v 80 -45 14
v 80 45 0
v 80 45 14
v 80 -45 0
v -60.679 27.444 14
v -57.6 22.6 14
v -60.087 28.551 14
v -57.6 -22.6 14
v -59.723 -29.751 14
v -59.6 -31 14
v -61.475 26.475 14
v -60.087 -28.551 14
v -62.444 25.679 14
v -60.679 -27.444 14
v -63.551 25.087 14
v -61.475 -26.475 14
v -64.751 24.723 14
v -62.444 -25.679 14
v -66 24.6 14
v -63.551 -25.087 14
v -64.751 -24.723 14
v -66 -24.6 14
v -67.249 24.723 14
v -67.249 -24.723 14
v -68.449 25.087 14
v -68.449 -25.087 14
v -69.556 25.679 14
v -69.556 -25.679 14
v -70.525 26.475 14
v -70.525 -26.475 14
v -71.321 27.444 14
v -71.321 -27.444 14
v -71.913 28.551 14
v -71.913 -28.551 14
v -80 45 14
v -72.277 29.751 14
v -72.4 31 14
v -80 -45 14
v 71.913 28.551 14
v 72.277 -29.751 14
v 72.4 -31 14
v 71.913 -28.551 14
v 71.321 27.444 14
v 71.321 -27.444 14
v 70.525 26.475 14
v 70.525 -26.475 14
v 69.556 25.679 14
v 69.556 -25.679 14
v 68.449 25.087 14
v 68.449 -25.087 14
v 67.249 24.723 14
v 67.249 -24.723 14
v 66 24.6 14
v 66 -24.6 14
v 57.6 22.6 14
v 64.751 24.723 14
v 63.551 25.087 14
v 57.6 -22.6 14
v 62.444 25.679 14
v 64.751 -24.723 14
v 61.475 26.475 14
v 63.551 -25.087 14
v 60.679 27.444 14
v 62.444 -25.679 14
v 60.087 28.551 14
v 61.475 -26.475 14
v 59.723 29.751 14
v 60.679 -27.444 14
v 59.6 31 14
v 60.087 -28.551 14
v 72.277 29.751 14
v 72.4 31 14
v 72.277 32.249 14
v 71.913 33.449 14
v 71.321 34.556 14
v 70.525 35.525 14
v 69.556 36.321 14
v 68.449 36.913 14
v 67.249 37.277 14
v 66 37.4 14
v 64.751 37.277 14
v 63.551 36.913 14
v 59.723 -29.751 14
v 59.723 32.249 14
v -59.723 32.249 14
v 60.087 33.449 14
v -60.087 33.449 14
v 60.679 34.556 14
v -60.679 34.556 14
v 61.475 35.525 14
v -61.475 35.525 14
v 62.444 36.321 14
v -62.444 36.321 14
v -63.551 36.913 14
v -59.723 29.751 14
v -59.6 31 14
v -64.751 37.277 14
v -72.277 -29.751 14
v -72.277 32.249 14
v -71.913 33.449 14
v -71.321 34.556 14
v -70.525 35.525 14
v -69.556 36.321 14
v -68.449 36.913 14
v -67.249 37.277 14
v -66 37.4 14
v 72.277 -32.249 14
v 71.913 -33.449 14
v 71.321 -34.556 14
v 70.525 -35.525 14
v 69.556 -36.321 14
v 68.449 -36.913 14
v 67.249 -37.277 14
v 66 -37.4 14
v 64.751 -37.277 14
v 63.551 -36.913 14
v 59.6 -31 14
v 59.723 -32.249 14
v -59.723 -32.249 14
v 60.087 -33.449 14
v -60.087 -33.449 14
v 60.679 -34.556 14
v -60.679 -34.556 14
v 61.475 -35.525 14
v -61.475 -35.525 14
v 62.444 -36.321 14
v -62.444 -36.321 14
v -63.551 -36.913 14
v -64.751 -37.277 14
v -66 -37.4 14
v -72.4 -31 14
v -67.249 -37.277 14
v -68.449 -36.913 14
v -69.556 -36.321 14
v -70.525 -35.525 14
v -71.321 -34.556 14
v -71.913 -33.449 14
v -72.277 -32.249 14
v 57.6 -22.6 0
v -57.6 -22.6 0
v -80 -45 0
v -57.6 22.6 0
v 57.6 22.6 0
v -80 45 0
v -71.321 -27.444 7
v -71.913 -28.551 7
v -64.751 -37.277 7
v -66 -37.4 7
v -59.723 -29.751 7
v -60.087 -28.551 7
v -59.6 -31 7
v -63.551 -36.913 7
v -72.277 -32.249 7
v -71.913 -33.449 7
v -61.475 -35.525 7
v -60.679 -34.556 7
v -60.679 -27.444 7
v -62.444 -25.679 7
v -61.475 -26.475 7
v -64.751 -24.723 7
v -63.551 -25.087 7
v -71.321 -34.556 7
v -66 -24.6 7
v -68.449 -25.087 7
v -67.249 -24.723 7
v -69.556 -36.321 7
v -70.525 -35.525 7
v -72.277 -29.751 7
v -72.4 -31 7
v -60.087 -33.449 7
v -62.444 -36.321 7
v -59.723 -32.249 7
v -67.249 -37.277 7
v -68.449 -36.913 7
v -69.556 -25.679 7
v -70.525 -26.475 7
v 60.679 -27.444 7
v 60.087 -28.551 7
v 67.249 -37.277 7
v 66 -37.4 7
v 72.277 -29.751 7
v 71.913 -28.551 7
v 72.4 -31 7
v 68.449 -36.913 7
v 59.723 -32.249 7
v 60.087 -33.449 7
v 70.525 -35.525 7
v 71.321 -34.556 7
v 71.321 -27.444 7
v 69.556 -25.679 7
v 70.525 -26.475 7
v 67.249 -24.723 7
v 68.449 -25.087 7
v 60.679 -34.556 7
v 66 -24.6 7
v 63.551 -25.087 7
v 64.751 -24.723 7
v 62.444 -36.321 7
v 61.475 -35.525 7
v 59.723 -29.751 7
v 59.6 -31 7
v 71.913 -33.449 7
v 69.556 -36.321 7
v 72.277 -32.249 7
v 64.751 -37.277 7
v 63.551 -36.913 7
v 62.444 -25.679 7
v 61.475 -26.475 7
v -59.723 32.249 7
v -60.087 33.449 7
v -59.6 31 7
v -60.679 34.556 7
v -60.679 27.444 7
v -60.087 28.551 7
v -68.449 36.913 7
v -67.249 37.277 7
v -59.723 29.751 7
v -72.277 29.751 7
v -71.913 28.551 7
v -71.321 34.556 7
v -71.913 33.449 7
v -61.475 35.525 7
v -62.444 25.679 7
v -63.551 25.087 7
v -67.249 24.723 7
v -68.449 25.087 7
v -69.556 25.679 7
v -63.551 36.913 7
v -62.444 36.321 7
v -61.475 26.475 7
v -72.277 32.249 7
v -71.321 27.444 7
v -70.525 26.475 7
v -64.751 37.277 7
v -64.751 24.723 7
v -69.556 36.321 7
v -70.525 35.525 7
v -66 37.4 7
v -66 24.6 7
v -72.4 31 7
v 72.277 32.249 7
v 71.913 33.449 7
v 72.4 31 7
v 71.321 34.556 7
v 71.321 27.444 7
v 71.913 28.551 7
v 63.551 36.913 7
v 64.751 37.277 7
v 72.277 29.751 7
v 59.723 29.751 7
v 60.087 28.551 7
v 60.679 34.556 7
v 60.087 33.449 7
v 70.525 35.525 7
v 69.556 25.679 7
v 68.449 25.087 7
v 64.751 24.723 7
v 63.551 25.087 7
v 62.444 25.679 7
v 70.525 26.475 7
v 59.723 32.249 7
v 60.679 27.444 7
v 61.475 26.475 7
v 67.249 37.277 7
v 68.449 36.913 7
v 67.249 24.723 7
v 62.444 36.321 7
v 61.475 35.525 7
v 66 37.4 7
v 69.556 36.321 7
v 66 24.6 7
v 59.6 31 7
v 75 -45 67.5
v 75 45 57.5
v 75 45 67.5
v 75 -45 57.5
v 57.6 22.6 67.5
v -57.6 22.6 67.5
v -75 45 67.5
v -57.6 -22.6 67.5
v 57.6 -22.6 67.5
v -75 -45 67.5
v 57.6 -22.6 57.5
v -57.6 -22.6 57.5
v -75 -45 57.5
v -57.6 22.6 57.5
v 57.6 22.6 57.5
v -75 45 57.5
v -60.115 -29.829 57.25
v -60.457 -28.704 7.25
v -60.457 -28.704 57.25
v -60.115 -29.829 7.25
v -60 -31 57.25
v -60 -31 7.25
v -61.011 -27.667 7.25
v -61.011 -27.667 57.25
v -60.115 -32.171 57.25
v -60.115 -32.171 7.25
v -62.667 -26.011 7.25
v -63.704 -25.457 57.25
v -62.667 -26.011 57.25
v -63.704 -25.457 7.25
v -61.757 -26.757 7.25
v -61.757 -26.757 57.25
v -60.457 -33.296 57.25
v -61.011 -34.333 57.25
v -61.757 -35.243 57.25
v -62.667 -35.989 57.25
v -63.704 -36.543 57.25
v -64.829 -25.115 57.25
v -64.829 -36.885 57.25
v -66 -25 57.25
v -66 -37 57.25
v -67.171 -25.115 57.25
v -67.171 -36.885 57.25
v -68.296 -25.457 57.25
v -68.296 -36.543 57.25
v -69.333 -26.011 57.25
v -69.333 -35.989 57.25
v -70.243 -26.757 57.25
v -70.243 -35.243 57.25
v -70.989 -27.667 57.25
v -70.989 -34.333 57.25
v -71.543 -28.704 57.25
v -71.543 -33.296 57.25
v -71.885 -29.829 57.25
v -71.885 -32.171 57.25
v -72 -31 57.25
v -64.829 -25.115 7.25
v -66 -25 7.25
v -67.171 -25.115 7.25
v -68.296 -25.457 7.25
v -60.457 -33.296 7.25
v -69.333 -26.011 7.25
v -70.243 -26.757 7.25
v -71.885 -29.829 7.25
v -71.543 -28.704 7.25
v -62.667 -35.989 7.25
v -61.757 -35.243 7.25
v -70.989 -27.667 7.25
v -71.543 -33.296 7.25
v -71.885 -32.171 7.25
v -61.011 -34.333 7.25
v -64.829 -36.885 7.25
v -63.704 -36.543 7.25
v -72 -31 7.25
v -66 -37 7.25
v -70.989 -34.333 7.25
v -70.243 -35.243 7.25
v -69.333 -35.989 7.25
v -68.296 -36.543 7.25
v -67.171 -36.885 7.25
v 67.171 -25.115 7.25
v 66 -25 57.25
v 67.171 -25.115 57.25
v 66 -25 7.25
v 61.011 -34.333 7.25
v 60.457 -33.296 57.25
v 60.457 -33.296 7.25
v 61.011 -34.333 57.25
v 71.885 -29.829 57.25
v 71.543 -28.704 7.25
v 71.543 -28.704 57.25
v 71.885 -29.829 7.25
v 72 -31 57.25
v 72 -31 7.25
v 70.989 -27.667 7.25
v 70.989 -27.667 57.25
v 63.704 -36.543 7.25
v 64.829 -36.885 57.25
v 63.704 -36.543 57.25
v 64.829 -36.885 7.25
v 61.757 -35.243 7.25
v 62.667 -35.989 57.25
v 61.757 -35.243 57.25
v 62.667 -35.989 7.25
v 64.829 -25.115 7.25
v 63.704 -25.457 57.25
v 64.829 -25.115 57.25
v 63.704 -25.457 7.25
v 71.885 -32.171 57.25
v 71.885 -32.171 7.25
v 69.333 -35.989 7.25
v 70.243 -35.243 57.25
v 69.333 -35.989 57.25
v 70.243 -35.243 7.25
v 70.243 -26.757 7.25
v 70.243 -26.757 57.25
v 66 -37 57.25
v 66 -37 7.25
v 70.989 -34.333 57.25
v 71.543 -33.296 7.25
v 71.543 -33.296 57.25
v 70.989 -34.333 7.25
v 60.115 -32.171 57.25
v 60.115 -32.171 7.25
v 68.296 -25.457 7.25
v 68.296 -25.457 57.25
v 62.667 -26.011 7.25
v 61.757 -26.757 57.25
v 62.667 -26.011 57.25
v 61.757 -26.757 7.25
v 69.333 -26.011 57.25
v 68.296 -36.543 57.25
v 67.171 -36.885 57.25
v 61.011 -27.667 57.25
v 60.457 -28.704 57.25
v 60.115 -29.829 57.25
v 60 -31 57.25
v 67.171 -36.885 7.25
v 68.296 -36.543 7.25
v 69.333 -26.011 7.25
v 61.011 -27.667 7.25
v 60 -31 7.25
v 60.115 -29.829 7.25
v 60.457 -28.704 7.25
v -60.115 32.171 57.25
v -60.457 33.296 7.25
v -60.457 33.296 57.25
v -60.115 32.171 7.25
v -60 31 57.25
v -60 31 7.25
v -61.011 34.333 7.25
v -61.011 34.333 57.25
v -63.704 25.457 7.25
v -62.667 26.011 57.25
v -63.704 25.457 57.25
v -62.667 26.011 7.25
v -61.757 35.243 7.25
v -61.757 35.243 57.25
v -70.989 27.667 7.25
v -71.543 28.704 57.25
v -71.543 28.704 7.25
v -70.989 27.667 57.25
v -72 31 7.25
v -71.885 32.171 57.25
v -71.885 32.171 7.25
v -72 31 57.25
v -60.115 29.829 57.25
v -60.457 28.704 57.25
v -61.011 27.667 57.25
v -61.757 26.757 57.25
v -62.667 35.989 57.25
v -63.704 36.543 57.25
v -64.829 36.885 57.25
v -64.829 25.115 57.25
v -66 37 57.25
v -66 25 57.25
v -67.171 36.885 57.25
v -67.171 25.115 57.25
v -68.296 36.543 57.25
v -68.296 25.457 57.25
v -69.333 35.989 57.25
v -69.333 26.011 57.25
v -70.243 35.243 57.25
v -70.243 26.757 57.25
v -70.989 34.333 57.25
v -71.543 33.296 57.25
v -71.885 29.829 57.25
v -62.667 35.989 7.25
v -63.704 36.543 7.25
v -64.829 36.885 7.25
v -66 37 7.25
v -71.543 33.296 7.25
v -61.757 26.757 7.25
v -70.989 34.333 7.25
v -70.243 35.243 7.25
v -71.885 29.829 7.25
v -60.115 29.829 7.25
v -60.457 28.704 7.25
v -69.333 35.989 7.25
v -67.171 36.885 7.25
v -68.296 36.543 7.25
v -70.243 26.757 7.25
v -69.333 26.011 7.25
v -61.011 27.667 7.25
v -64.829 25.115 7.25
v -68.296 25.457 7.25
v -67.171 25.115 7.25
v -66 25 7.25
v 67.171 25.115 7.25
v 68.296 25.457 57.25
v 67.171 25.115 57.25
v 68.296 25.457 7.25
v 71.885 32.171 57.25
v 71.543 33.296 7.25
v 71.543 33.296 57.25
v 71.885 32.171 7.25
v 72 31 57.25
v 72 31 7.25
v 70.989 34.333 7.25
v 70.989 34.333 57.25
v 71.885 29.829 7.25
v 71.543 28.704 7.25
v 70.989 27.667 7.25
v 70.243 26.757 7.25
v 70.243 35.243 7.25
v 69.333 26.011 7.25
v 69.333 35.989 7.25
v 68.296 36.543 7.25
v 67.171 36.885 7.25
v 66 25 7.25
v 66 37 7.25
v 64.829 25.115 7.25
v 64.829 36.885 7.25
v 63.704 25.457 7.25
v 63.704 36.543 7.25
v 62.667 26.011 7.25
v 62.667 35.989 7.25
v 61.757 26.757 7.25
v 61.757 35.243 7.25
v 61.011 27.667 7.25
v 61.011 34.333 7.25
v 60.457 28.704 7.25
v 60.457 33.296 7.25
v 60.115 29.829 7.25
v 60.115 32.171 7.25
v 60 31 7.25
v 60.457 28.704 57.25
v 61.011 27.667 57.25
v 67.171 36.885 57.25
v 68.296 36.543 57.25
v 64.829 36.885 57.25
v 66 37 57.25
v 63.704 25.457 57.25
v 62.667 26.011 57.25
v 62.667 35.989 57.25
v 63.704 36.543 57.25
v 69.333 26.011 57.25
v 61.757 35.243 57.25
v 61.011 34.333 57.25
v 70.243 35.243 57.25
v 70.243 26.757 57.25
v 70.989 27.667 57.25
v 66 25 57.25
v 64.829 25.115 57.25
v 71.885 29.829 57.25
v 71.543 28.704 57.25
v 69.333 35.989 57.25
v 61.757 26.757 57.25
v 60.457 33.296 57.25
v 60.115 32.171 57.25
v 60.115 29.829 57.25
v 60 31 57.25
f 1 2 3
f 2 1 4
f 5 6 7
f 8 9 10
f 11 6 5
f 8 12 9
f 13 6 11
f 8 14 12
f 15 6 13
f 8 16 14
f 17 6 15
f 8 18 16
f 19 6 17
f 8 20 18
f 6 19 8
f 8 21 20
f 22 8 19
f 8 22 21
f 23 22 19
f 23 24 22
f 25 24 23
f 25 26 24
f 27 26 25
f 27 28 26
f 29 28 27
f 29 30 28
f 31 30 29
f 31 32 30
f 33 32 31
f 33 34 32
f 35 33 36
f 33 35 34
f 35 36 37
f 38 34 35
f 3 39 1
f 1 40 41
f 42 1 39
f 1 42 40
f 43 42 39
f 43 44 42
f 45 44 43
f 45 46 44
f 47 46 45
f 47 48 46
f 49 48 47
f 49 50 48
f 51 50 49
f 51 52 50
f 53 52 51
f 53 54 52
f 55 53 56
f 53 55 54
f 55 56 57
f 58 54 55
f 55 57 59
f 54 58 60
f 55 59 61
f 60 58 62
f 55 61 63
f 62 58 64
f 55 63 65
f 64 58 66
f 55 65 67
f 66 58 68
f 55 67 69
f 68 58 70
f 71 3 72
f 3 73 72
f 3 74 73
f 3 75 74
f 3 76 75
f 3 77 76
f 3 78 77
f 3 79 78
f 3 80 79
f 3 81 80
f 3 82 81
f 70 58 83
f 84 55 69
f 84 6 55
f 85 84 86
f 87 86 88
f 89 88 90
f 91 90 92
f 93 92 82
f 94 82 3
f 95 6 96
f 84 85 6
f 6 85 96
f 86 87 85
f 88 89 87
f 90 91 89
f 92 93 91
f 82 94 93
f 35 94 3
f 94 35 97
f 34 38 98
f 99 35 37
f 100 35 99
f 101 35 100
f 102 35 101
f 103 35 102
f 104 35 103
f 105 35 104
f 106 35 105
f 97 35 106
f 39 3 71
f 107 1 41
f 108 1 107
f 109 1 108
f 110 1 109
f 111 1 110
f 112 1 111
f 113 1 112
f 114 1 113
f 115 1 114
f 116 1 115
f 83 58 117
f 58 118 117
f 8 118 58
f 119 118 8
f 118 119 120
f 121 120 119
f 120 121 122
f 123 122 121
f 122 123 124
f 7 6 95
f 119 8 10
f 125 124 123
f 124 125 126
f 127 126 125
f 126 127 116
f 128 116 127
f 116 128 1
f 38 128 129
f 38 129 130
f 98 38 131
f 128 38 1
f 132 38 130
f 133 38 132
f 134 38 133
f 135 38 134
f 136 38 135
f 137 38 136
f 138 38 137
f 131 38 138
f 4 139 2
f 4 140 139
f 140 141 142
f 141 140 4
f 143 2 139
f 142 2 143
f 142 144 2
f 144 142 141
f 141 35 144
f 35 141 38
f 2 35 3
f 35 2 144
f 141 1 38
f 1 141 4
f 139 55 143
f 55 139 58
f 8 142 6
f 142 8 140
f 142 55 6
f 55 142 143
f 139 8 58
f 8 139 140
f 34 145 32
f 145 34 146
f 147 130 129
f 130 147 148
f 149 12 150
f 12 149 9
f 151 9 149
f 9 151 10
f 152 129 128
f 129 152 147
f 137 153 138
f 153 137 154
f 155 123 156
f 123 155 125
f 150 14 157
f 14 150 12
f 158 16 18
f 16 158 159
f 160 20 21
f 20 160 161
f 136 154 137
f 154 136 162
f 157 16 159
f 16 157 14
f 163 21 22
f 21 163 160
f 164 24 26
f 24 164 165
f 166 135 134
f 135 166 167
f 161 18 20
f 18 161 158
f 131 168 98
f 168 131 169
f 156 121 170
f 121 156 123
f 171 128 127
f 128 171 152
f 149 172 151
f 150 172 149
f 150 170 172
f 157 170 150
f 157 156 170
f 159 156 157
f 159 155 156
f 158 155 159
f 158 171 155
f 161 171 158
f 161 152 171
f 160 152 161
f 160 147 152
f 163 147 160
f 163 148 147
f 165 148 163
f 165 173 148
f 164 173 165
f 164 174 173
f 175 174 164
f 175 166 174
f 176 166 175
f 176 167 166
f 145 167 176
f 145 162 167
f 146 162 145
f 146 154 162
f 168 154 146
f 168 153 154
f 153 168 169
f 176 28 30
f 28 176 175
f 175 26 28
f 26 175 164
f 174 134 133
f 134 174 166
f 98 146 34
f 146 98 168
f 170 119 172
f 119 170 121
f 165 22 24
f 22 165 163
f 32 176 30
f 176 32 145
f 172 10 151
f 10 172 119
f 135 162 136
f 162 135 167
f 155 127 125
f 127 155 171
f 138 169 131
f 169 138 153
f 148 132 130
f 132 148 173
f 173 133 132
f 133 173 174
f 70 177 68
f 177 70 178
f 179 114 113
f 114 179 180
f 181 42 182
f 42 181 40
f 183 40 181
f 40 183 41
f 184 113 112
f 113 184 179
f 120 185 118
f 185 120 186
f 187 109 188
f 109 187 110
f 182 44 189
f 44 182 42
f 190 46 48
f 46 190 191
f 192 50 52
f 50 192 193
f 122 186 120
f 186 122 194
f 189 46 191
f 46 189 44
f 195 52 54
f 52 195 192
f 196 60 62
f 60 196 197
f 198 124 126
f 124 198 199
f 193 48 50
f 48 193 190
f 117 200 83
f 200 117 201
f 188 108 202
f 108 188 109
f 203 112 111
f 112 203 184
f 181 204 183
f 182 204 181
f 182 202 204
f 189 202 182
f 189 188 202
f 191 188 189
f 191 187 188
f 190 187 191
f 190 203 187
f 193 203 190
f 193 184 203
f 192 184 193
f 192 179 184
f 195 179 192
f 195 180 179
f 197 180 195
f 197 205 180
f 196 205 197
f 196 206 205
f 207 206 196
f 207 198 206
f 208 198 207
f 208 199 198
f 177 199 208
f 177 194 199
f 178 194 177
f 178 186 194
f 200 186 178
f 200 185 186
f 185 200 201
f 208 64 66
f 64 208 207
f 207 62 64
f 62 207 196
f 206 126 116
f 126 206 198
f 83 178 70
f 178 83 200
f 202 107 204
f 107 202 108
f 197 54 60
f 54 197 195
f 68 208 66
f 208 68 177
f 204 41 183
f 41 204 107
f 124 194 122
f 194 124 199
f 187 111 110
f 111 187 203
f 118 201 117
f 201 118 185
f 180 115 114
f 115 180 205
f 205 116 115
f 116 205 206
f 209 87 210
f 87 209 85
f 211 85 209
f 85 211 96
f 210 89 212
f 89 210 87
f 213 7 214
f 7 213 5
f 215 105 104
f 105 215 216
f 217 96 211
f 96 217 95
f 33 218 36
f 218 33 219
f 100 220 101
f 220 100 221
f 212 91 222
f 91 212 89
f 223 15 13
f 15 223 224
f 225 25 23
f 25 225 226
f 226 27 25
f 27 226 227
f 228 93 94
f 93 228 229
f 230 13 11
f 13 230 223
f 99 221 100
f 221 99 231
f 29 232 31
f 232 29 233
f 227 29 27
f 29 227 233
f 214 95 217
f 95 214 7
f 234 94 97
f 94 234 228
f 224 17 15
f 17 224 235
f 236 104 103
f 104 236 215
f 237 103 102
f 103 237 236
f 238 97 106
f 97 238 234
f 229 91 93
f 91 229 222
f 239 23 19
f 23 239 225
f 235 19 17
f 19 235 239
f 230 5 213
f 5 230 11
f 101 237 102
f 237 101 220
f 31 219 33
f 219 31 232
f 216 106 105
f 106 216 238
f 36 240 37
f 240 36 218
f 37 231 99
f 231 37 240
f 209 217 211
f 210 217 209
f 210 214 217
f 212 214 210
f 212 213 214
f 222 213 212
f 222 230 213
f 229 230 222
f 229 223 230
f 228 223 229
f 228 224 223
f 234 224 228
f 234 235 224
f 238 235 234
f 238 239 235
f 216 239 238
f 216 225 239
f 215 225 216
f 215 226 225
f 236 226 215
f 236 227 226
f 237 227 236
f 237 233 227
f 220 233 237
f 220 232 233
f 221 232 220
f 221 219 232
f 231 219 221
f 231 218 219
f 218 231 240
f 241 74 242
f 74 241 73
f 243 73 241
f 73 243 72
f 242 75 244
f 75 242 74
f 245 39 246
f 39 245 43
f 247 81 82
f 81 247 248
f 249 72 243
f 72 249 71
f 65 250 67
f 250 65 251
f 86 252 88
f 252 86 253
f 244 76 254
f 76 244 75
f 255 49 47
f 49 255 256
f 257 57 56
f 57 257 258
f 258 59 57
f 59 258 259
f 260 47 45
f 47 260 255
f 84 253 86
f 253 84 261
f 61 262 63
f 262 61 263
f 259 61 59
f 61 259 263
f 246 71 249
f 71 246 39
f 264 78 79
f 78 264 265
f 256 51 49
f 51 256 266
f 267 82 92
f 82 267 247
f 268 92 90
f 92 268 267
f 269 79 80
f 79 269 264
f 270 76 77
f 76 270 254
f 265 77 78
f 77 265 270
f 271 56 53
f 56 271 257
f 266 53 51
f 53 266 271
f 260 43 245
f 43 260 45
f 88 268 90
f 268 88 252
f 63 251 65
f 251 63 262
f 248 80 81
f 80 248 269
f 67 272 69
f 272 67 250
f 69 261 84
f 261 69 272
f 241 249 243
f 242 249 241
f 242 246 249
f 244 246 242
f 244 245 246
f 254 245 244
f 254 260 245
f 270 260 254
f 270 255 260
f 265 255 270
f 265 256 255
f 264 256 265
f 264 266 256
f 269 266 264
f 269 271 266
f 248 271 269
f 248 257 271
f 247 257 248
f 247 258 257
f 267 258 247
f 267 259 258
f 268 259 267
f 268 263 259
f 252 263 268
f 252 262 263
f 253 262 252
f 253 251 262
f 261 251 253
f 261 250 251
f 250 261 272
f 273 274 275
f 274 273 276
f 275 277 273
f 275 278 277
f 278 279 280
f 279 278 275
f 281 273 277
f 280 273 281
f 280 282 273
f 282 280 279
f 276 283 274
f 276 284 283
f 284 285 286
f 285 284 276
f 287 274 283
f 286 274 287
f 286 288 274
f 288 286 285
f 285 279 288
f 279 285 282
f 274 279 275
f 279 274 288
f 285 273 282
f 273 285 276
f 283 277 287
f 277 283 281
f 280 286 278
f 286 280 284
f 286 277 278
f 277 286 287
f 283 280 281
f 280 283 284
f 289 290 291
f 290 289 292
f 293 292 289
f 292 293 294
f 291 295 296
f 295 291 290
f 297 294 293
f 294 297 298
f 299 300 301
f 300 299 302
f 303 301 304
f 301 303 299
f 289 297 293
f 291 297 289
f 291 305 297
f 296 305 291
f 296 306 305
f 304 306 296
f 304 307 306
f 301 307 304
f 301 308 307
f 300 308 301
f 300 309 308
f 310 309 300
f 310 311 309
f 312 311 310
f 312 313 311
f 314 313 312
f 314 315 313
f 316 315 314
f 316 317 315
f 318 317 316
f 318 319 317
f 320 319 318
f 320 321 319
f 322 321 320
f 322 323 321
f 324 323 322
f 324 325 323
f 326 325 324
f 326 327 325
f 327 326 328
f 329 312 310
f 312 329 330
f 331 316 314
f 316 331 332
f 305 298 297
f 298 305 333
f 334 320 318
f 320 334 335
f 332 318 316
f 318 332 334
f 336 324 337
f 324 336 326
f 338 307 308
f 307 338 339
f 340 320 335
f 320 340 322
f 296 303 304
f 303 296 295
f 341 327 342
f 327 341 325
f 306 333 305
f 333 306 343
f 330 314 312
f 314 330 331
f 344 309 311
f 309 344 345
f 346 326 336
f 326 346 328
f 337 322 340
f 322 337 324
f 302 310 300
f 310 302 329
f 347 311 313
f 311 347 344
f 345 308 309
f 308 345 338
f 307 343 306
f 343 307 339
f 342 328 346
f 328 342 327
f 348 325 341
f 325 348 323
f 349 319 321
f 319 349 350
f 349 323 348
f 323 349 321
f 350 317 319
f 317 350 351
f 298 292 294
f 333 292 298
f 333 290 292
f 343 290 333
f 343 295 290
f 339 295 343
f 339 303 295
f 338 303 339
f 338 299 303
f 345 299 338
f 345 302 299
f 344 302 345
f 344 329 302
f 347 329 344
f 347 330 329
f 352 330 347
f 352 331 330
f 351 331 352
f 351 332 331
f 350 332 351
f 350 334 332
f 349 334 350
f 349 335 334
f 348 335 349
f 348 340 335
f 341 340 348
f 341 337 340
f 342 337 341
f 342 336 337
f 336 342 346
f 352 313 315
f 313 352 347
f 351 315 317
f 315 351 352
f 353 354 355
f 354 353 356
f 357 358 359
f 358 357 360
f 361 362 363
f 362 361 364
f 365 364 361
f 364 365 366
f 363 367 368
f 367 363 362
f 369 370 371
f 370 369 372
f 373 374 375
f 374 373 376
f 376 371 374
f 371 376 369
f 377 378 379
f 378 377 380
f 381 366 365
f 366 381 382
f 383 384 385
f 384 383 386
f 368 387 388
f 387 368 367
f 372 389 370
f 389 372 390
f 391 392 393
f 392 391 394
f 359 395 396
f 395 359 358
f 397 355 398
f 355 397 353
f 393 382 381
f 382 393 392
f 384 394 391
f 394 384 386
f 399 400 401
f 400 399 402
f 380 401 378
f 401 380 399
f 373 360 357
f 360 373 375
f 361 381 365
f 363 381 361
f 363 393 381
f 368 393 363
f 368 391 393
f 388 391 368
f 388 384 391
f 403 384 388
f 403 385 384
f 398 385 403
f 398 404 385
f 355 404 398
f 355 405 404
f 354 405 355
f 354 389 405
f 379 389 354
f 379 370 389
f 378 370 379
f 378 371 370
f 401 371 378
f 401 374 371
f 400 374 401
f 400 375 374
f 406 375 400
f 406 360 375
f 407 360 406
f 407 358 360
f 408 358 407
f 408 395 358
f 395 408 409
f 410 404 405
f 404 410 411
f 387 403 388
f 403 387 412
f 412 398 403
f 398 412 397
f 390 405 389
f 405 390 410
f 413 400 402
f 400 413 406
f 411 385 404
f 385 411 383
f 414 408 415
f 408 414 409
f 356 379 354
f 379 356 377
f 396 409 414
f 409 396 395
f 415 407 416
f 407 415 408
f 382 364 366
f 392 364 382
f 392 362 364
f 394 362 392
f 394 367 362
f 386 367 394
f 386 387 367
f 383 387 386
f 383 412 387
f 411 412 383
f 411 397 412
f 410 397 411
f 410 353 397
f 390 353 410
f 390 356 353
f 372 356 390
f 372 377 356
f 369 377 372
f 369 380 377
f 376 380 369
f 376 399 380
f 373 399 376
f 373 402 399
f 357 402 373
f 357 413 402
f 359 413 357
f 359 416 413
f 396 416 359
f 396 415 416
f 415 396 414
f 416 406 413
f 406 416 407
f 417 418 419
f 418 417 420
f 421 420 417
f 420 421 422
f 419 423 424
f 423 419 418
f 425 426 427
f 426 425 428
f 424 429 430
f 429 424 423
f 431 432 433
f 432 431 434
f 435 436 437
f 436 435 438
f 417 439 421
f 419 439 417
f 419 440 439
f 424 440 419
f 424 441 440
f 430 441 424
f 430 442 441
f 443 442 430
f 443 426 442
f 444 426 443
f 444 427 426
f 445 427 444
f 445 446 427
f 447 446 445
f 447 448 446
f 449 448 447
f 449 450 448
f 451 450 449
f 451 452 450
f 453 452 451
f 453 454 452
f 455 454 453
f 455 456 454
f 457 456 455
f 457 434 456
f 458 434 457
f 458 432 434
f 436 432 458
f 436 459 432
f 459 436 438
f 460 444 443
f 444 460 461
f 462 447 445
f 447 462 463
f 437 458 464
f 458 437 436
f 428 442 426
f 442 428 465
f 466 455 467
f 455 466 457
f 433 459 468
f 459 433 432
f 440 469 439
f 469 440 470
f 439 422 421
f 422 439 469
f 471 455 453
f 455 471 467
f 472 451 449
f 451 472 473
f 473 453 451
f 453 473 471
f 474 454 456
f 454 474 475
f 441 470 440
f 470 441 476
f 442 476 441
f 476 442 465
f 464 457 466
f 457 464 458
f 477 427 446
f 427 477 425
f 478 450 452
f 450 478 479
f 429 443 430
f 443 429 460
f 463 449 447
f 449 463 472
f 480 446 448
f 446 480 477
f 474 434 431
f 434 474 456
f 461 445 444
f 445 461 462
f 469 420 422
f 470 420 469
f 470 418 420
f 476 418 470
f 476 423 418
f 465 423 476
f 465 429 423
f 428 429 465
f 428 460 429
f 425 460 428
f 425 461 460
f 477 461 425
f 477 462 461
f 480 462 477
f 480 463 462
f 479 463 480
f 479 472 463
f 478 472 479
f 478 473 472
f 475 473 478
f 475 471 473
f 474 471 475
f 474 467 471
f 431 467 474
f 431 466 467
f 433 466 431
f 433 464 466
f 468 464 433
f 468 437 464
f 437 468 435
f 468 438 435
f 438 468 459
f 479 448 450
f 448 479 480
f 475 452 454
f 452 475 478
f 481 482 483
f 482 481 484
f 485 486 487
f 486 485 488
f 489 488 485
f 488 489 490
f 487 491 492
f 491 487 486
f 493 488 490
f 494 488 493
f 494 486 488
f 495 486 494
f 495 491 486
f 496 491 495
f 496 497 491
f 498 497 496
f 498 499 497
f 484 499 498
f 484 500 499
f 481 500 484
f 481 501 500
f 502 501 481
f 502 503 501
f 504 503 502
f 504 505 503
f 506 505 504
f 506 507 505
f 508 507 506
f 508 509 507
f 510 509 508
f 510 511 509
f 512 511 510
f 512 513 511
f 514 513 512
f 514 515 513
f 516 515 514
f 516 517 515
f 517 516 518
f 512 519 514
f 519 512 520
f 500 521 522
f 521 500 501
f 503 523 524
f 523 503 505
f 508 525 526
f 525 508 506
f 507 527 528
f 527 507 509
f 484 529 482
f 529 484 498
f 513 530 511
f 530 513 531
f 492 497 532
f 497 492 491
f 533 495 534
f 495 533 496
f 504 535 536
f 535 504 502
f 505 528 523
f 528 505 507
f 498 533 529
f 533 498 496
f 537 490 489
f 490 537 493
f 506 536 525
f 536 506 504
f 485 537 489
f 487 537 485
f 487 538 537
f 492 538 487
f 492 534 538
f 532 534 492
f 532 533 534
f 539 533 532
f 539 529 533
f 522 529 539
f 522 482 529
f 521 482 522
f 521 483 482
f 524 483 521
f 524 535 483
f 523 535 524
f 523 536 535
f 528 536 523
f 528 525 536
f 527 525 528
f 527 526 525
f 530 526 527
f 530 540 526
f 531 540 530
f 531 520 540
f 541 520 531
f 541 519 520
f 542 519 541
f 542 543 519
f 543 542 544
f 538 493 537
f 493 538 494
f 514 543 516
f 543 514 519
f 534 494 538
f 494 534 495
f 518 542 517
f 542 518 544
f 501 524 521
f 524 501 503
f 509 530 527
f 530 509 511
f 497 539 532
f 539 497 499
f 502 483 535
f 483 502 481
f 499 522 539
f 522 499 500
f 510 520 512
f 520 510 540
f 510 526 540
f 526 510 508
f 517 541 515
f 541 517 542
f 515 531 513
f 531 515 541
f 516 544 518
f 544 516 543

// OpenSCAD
$fn = 32;

// ------------------------------------------------------------------------
// Frame cube: base 160 x 90 mm, posts 50 mm tall
// Every part is its own module, assembly() places every instance.
// ------------------------------------------------------------------------

// --- part 1 ---
module base_frame() {
  difference() {
    translate([-80, -45, 0]) cube([160, 90, 14]);
    translate([-57.6, -22.6, -1]) cube([115.2, 45.2, 16]);
    translate([-66, -31, 7]) cylinder(h = 8, d = 12.8);
    translate([66, -31, 7]) cylinder(h = 8, d = 12.8);
    translate([-66, 31, 7]) cylinder(h = 8, d = 12.8);
    translate([66, 31, 7]) cylinder(h = 8, d = 12.8);
  }
}

// --- part 2 ---
module corner_post() {
  cylinder(h = 50, d = 12);
}

// --- part 3 ---
module top_frame() {
  difference() {
    translate([-75, -45, 0]) cube([150, 90, 10]);
    translate([-57.6, -22.6, -1]) cube([115.2, 45.2, 12]);
  }
}

// --- assembly ---
module assembly() {
  color([0.80, 0.24, 0.20]) translate([0, 0, 0]) rotate([0, 0, 0]) base_frame();
  color([0.20, 0.45, 0.75]) translate([-66, -31, 7.25]) rotate([0, 0, 0]) corner_post();
  color([0.25, 0.62, 0.32]) translate([66, -31, 7.25]) rotate([0, 0, 0]) corner_post();
  color([0.92, 0.70, 0.18]) translate([-66, 31, 7.25]) rotate([0, 0, 0]) corner_post();
  color([0.58, 0.35, 0.70]) translate([66, 31, 7.25]) rotate([0, 0, 0]) corner_post();
  color([0.16, 0.66, 0.66]) translate([0, 0, 57.5]) rotate([0, 0, 0]) top_frame();
}

assembly();
